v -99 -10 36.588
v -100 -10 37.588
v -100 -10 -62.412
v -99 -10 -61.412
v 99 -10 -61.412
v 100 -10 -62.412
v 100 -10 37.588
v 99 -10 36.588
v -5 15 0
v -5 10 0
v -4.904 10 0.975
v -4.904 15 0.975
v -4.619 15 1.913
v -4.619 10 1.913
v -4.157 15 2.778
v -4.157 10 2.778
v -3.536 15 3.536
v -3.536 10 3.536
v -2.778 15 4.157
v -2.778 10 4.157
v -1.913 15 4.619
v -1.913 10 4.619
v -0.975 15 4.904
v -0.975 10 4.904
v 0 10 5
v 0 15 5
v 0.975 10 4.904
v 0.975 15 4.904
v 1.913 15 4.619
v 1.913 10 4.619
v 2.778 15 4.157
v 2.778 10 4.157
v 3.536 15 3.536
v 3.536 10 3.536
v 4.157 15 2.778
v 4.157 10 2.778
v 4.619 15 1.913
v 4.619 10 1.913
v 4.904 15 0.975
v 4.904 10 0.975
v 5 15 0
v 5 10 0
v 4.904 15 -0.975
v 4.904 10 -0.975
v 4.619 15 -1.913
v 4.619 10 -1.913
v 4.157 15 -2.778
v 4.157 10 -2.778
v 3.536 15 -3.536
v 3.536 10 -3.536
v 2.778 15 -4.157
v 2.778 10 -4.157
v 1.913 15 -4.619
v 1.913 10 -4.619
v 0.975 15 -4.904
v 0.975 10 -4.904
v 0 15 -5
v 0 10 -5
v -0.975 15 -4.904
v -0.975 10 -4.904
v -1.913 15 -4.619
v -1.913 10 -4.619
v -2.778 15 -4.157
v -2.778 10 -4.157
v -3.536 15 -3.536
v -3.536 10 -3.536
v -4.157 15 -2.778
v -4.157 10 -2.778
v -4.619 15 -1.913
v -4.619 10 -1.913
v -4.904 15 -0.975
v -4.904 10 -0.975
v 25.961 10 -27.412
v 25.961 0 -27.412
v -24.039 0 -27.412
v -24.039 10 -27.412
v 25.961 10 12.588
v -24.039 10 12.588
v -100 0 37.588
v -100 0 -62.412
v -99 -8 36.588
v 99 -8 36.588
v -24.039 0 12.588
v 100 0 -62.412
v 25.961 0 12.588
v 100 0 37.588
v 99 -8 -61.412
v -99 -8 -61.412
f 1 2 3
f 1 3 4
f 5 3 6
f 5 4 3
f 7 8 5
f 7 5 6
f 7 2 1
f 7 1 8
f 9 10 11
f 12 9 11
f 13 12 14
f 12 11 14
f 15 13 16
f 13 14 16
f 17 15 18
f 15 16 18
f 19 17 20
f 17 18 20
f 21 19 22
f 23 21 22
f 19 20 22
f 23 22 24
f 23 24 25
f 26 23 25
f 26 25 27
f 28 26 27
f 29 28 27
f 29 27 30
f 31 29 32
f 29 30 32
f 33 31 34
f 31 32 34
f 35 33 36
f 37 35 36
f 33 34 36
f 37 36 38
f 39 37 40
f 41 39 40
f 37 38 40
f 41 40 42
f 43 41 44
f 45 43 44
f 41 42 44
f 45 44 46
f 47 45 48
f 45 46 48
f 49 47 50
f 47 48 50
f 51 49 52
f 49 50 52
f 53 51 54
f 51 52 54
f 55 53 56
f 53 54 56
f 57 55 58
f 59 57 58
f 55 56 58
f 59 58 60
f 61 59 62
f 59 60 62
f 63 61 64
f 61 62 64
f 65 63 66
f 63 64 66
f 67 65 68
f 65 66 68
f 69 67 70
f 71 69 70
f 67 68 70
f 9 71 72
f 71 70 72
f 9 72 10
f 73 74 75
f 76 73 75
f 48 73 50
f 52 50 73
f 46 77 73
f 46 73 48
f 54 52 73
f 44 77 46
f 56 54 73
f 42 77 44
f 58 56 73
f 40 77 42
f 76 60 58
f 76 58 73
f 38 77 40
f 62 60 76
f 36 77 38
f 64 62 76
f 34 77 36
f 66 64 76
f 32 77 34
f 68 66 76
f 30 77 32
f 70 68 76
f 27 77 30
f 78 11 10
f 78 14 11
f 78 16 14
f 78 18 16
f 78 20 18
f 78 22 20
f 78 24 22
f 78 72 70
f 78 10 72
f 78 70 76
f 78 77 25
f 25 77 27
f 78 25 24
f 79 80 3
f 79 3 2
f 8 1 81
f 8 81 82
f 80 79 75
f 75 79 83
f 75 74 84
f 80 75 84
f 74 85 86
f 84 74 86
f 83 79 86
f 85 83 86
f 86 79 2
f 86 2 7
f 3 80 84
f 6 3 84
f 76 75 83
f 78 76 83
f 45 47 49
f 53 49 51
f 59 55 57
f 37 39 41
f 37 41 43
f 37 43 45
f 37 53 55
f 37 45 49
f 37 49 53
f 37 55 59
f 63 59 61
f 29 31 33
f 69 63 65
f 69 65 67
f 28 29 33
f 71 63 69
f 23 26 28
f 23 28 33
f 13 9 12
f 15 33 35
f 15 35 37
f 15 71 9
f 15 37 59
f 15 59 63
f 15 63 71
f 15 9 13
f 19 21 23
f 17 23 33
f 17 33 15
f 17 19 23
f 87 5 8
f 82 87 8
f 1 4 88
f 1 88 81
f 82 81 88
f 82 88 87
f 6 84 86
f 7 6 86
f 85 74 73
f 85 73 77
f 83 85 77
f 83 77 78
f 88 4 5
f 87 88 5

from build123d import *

# Parameters (mm, degrees)
F0_W     = 200
F0_H     = 100
F1_DEPTH = 10
F2_W     = 198
F2_H     = 98
F3_DEPTH = 2
F4_W     = 50
F4_H     = 40
F5_DEPTH = 10
F6_R     = 5
F7_DEPTH = 5


with BuildPart() as f1:
    # F0 (on Front) → F1 (new body)
    with BuildSketch(Plane.XZ):
        with Locations((0, -12.41183)):
            Rectangle(F0_W, F0_H)
    extrude(amount=F1_DEPTH)

    # F2 (on face) → F3 (cut)
    with BuildSketch(Plane.XZ.offset(10)):
        with Locations((0, -12.41183)):
            Rectangle(F2_W, F2_H)
    extrude(amount=-F3_DEPTH, mode=Mode.SUBTRACT)

    # F4 (on face) → F5 (join)
    with BuildSketch(Plane(origin=(0, 0, 0), x_dir=(-1, 0, 0), z_dir=(0, 1, 0))):
        with Locations((-0.960992, -7.41183)):
            Rectangle(F4_W, F4_H)
    extrude(amount=F5_DEPTH)

    # F6 (on face) → F7 (join)
    with BuildSketch(Plane(origin=(0, 10, 0), x_dir=(-1, 0, 0), z_dir=(0, 1, 0))):
        Circle(F6_R)
    extrude(amount=F7_DEPTH)


solid = f1.part
